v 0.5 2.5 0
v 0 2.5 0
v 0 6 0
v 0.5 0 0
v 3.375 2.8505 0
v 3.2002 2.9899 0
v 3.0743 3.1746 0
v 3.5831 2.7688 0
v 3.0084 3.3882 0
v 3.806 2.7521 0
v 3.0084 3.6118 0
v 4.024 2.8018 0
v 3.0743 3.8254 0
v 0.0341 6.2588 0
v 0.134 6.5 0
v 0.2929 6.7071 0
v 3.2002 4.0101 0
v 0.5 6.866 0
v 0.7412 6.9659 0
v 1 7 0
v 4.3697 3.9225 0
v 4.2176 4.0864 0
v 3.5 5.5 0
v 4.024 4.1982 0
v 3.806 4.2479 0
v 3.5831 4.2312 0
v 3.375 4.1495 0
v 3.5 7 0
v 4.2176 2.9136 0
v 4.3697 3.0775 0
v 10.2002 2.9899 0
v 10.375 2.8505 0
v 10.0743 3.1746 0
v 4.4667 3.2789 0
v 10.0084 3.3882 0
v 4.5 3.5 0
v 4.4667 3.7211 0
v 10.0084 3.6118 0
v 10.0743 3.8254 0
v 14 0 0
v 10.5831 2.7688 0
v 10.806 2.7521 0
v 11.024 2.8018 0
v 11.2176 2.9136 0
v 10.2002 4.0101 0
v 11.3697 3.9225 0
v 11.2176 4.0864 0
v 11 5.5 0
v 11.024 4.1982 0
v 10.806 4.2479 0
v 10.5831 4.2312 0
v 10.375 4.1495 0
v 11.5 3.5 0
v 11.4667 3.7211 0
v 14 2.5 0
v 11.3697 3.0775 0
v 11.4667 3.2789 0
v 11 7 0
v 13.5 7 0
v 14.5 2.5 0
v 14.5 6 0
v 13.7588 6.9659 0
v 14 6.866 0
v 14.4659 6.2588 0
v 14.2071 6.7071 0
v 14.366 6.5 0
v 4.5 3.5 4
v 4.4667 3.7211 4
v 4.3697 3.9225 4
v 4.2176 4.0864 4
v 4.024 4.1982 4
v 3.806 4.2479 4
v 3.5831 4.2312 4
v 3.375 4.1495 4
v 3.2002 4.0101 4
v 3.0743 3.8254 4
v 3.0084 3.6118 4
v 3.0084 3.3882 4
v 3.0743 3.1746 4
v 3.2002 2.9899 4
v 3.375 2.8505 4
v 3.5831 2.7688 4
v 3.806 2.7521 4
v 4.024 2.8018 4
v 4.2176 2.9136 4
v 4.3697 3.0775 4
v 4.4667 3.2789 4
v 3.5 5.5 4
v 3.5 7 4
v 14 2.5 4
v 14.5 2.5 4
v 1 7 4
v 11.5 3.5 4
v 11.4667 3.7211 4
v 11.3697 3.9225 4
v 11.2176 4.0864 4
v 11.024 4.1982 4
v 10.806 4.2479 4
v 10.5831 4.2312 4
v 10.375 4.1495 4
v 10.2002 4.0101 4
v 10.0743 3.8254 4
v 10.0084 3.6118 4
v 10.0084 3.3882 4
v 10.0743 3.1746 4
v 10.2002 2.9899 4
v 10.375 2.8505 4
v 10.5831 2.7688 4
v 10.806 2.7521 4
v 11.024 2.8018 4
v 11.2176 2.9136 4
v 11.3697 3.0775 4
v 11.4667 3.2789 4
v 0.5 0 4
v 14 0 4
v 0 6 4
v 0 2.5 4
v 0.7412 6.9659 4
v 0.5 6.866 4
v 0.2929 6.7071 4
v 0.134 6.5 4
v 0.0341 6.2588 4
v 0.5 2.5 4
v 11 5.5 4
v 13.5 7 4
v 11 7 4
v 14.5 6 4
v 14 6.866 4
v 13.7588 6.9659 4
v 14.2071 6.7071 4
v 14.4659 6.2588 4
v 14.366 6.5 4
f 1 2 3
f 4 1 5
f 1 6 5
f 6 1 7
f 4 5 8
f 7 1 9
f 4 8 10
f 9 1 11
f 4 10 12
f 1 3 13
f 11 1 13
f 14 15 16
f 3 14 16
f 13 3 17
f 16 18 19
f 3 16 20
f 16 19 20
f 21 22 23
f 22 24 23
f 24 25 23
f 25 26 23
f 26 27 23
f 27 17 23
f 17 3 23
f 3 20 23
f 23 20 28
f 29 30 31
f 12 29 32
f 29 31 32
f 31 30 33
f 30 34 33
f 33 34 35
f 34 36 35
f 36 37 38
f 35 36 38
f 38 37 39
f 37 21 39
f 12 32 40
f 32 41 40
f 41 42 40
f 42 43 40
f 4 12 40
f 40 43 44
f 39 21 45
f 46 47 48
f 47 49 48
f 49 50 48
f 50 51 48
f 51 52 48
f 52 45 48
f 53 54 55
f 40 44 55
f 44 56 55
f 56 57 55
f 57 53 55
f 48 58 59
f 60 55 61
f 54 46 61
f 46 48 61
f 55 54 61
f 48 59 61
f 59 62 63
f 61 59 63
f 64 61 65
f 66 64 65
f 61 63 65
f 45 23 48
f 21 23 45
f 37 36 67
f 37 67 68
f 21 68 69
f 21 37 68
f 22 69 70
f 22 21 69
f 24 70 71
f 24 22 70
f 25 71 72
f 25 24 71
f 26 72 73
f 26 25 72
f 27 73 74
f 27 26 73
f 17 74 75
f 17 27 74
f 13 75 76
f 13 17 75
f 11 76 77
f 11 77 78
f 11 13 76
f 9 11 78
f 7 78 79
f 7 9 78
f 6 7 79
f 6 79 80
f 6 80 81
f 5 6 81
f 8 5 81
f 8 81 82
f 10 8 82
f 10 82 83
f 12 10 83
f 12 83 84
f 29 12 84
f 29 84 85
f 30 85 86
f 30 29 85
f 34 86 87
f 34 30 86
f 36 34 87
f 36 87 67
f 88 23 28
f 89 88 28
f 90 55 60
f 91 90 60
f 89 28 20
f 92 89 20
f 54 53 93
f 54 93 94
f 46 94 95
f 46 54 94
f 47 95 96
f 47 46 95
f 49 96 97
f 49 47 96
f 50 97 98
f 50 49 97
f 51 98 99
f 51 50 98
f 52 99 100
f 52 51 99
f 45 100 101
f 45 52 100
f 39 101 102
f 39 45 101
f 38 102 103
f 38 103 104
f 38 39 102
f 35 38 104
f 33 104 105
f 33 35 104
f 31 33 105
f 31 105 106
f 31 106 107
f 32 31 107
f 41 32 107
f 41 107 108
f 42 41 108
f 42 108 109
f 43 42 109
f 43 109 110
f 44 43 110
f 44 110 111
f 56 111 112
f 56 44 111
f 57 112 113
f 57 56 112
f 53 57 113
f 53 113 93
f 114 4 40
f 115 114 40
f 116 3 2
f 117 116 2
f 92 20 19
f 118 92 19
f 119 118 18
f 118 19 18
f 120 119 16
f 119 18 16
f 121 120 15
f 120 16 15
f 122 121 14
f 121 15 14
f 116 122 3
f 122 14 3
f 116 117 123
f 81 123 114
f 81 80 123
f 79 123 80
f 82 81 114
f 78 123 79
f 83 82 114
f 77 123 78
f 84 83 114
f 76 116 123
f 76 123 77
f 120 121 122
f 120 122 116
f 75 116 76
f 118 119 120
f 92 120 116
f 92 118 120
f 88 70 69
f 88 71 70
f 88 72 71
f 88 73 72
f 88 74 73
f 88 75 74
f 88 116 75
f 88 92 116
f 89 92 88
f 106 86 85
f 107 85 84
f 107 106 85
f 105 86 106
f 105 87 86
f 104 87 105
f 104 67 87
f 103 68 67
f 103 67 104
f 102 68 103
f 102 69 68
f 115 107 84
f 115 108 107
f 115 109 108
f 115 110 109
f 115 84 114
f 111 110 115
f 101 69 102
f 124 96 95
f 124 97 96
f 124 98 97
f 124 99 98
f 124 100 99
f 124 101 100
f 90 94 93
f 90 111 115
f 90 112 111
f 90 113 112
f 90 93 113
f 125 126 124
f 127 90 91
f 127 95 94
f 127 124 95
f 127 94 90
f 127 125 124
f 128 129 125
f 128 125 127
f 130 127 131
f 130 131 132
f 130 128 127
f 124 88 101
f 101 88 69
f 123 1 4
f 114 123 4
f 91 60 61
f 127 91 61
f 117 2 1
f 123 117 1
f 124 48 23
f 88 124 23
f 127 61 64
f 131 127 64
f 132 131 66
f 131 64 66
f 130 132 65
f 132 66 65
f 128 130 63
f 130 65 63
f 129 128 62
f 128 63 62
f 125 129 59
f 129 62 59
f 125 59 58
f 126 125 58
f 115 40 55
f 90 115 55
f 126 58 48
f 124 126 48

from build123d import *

# Parameters (mm, degrees)
F0_R     = 0.75
F1_DEPTH = 4


with BuildPart() as f1:
    # F0 (on Top) → F1 (new body)
    with BuildSketch(Plane.XY):
        with BuildLine():
            ThreePointArc((1, 7), (0.292893, 6.707107), (0, 6))
            ThreePointArc((0, 6), (1, 5), (2, 6))
            ThreePointArc((2, 6), (1.707107, 6.707107), (1, 7))
        make_face()
        with BuildLine():
            Line((0.5, 2.5), (0.5, 0))
            Line((0.5, 0), (14, 0))
            Line((14, 0), (14, 2.5))
            Line((14, 2.5), (14.5, 2.5))
            Line((14.5, 2.5), (14.5, 6))
            ThreePointArc((14.5, 6), (12.792893, 5.292893), (13.5, 7))
            Line((13.5, 7), (11, 7))
            Line((11, 7), (11, 5.5))
            Line((11, 5.5), (3.5, 5.5))
            Line((3.5, 5.5), (3.5, 7))
            Line((3.5, 7), (1, 7))
            ThreePointArc((1, 7), (1.707107, 6.707107), (2, 6))
            ThreePointArc((2, 6), (1, 5), (0, 6))
            Line((0, 6), (0, 2.5))
            Line((0, 2.5), (0.5, 2.5))
        make_face()
        with Locations((3.75, 3.5)):
            Circle(F0_R, mode=Mode.SUBTRACT)
        with Locations((10.75, 3.5)):
            Circle(F0_R, mode=Mode.SUBTRACT)
        with BuildLine():
            ThreePointArc((13.5, 7), (12.792893, 5.292893), (14.5, 6))
            ThreePointArc((14.5, 6), (14.207107, 6.707107), (13.5, 7))
        make_face()
    extrude(amount=F1_DEPTH)


solid = f1.part
